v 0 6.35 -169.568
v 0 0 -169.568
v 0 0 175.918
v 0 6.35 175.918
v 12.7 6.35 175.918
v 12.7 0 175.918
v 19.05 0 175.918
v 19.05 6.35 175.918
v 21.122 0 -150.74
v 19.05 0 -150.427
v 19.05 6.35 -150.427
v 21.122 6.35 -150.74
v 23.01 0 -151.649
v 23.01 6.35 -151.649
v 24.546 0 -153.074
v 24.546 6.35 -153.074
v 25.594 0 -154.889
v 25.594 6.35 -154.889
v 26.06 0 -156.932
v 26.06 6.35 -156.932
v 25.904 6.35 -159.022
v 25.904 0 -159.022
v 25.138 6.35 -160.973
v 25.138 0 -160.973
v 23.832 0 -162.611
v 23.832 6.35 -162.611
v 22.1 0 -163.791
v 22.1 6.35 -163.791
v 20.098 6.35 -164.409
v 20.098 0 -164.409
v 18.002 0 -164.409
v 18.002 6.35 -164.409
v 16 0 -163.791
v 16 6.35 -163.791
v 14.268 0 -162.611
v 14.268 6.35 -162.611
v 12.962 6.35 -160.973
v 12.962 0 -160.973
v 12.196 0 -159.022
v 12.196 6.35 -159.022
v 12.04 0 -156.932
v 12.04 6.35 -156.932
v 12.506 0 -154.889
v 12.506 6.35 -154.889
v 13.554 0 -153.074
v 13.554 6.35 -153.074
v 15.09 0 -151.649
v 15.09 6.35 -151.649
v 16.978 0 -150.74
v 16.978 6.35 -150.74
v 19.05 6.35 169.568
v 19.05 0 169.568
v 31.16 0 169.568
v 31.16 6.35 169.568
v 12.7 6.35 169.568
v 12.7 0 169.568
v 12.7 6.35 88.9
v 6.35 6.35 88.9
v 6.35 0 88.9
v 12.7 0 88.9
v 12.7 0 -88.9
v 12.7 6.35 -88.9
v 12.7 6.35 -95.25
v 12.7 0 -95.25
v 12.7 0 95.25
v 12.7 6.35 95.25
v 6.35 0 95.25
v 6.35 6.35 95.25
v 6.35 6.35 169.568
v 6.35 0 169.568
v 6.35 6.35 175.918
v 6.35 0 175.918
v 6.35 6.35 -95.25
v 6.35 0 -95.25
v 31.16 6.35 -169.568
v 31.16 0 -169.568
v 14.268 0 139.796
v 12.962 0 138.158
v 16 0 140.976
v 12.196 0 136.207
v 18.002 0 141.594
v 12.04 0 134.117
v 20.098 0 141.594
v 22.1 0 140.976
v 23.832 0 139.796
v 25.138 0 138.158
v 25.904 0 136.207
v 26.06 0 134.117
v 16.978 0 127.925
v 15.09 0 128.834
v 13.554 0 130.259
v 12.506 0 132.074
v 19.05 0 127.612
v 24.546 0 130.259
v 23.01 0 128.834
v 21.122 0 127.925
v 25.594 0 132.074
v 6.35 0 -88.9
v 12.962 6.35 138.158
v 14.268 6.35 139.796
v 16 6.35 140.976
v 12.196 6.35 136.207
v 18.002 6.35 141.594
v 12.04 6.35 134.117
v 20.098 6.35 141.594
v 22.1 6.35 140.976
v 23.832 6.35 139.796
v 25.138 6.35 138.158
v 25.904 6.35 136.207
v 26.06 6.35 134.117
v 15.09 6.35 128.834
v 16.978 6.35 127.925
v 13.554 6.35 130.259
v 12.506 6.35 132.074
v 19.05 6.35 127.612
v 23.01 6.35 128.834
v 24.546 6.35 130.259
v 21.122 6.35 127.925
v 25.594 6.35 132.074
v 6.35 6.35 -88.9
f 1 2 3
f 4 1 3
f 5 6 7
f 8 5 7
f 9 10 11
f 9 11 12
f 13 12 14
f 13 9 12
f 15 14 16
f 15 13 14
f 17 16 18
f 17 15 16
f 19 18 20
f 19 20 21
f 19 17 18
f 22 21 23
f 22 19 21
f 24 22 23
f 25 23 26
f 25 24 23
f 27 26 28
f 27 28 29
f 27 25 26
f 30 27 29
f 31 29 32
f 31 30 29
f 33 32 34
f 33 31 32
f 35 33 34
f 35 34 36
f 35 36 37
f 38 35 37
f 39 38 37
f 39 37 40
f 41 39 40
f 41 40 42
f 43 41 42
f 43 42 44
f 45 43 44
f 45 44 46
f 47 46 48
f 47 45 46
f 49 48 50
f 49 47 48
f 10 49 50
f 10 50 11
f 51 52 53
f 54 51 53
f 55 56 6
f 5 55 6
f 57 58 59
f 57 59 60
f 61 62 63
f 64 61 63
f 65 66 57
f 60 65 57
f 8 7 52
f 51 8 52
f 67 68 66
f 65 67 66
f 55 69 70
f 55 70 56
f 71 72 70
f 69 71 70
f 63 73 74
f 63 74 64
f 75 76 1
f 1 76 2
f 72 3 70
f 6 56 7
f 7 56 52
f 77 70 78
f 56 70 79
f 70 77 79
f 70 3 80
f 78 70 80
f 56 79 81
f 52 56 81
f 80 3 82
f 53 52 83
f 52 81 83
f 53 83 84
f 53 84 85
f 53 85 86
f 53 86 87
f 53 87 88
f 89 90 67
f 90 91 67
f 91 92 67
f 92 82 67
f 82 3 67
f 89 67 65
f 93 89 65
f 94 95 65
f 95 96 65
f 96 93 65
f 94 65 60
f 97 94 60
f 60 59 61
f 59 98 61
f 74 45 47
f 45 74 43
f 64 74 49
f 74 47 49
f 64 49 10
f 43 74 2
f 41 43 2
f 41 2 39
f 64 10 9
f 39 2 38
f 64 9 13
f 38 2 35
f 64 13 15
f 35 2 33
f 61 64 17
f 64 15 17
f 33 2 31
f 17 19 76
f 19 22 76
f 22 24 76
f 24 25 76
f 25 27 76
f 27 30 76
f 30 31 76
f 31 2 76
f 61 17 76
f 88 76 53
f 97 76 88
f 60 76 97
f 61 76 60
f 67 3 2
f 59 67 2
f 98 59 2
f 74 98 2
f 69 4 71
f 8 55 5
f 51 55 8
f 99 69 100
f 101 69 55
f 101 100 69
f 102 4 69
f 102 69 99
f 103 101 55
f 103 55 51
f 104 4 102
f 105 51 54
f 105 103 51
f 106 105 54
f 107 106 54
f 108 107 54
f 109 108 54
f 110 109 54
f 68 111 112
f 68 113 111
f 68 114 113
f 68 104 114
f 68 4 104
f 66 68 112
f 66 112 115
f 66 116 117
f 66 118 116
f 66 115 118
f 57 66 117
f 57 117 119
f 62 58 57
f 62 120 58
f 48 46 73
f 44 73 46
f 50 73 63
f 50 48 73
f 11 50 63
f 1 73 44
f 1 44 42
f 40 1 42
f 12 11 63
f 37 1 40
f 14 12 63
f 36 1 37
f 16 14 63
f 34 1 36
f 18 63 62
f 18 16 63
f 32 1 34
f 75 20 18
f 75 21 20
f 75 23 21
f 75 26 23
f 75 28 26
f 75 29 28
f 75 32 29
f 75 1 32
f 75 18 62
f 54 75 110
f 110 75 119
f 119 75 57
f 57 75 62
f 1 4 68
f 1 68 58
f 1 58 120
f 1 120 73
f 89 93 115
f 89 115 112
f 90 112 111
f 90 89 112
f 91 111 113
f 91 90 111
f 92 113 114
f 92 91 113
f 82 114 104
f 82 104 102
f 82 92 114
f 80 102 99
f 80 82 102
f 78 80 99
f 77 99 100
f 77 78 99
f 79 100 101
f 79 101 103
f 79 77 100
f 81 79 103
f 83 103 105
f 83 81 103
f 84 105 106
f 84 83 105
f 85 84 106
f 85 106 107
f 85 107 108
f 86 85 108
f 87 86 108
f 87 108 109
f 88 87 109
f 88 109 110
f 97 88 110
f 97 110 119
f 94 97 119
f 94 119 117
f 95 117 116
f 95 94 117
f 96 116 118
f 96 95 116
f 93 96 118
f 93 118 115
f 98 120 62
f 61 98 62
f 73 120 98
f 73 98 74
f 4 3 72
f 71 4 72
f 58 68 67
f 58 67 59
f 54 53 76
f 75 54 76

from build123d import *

# Parameters (mm, degrees)
AXLE_SUPPORT_PLATE_R = 7.030128061
AXLE_SUPPORT_PLATE_W = 6.35
AXLE_SUPPORT_PLATE_H = 6.35
BOSS_EXTRUDE1_DEPTH  = 6.35


with BuildPart() as part:
    # Axle Support Plate → Boss-Extrude1 (new body)
    with BuildSketch(Plane(origin=(0, 0, 0), x_dir=(1, 0, 0), z_dir=(0, 1, 0))):
        Polygon((31.160128061, -169.56756403), (31.160128061, 169.56756403), (0, 169.56756403), (0, -175.91756403), (6.35, -175.91756403), (6.35, -169.56756403), (12.7, -169.56756403), (12.7, -175.91756403), (19.05, -175.91756403), (19.05, -169.56756403), align=None)
        with Locations(Location((19.05, 157.45743597, 0), (0, 0, 270))):
            Circle(AXLE_SUPPORT_PLATE_R, mode=Mode.SUBTRACT)
        with Locations(Location((19.05, -134.64256403, 0), (0, 0, 90))):
            Circle(AXLE_SUPPORT_PLATE_R, mode=Mode.SUBTRACT)
        with Locations((9.525, -92.075)):
            Rectangle(AXLE_SUPPORT_PLATE_W, AXLE_SUPPORT_PLATE_H, mode=Mode.SUBTRACT)
        with Locations((9.525, 92.075)):
            Rectangle(AXLE_SUPPORT_PLATE_W, AXLE_SUPPORT_PLATE_H, mode=Mode.SUBTRACT)
    extrude(amount=BOSS_EXTRUDE1_DEPTH)


solid = part.part
